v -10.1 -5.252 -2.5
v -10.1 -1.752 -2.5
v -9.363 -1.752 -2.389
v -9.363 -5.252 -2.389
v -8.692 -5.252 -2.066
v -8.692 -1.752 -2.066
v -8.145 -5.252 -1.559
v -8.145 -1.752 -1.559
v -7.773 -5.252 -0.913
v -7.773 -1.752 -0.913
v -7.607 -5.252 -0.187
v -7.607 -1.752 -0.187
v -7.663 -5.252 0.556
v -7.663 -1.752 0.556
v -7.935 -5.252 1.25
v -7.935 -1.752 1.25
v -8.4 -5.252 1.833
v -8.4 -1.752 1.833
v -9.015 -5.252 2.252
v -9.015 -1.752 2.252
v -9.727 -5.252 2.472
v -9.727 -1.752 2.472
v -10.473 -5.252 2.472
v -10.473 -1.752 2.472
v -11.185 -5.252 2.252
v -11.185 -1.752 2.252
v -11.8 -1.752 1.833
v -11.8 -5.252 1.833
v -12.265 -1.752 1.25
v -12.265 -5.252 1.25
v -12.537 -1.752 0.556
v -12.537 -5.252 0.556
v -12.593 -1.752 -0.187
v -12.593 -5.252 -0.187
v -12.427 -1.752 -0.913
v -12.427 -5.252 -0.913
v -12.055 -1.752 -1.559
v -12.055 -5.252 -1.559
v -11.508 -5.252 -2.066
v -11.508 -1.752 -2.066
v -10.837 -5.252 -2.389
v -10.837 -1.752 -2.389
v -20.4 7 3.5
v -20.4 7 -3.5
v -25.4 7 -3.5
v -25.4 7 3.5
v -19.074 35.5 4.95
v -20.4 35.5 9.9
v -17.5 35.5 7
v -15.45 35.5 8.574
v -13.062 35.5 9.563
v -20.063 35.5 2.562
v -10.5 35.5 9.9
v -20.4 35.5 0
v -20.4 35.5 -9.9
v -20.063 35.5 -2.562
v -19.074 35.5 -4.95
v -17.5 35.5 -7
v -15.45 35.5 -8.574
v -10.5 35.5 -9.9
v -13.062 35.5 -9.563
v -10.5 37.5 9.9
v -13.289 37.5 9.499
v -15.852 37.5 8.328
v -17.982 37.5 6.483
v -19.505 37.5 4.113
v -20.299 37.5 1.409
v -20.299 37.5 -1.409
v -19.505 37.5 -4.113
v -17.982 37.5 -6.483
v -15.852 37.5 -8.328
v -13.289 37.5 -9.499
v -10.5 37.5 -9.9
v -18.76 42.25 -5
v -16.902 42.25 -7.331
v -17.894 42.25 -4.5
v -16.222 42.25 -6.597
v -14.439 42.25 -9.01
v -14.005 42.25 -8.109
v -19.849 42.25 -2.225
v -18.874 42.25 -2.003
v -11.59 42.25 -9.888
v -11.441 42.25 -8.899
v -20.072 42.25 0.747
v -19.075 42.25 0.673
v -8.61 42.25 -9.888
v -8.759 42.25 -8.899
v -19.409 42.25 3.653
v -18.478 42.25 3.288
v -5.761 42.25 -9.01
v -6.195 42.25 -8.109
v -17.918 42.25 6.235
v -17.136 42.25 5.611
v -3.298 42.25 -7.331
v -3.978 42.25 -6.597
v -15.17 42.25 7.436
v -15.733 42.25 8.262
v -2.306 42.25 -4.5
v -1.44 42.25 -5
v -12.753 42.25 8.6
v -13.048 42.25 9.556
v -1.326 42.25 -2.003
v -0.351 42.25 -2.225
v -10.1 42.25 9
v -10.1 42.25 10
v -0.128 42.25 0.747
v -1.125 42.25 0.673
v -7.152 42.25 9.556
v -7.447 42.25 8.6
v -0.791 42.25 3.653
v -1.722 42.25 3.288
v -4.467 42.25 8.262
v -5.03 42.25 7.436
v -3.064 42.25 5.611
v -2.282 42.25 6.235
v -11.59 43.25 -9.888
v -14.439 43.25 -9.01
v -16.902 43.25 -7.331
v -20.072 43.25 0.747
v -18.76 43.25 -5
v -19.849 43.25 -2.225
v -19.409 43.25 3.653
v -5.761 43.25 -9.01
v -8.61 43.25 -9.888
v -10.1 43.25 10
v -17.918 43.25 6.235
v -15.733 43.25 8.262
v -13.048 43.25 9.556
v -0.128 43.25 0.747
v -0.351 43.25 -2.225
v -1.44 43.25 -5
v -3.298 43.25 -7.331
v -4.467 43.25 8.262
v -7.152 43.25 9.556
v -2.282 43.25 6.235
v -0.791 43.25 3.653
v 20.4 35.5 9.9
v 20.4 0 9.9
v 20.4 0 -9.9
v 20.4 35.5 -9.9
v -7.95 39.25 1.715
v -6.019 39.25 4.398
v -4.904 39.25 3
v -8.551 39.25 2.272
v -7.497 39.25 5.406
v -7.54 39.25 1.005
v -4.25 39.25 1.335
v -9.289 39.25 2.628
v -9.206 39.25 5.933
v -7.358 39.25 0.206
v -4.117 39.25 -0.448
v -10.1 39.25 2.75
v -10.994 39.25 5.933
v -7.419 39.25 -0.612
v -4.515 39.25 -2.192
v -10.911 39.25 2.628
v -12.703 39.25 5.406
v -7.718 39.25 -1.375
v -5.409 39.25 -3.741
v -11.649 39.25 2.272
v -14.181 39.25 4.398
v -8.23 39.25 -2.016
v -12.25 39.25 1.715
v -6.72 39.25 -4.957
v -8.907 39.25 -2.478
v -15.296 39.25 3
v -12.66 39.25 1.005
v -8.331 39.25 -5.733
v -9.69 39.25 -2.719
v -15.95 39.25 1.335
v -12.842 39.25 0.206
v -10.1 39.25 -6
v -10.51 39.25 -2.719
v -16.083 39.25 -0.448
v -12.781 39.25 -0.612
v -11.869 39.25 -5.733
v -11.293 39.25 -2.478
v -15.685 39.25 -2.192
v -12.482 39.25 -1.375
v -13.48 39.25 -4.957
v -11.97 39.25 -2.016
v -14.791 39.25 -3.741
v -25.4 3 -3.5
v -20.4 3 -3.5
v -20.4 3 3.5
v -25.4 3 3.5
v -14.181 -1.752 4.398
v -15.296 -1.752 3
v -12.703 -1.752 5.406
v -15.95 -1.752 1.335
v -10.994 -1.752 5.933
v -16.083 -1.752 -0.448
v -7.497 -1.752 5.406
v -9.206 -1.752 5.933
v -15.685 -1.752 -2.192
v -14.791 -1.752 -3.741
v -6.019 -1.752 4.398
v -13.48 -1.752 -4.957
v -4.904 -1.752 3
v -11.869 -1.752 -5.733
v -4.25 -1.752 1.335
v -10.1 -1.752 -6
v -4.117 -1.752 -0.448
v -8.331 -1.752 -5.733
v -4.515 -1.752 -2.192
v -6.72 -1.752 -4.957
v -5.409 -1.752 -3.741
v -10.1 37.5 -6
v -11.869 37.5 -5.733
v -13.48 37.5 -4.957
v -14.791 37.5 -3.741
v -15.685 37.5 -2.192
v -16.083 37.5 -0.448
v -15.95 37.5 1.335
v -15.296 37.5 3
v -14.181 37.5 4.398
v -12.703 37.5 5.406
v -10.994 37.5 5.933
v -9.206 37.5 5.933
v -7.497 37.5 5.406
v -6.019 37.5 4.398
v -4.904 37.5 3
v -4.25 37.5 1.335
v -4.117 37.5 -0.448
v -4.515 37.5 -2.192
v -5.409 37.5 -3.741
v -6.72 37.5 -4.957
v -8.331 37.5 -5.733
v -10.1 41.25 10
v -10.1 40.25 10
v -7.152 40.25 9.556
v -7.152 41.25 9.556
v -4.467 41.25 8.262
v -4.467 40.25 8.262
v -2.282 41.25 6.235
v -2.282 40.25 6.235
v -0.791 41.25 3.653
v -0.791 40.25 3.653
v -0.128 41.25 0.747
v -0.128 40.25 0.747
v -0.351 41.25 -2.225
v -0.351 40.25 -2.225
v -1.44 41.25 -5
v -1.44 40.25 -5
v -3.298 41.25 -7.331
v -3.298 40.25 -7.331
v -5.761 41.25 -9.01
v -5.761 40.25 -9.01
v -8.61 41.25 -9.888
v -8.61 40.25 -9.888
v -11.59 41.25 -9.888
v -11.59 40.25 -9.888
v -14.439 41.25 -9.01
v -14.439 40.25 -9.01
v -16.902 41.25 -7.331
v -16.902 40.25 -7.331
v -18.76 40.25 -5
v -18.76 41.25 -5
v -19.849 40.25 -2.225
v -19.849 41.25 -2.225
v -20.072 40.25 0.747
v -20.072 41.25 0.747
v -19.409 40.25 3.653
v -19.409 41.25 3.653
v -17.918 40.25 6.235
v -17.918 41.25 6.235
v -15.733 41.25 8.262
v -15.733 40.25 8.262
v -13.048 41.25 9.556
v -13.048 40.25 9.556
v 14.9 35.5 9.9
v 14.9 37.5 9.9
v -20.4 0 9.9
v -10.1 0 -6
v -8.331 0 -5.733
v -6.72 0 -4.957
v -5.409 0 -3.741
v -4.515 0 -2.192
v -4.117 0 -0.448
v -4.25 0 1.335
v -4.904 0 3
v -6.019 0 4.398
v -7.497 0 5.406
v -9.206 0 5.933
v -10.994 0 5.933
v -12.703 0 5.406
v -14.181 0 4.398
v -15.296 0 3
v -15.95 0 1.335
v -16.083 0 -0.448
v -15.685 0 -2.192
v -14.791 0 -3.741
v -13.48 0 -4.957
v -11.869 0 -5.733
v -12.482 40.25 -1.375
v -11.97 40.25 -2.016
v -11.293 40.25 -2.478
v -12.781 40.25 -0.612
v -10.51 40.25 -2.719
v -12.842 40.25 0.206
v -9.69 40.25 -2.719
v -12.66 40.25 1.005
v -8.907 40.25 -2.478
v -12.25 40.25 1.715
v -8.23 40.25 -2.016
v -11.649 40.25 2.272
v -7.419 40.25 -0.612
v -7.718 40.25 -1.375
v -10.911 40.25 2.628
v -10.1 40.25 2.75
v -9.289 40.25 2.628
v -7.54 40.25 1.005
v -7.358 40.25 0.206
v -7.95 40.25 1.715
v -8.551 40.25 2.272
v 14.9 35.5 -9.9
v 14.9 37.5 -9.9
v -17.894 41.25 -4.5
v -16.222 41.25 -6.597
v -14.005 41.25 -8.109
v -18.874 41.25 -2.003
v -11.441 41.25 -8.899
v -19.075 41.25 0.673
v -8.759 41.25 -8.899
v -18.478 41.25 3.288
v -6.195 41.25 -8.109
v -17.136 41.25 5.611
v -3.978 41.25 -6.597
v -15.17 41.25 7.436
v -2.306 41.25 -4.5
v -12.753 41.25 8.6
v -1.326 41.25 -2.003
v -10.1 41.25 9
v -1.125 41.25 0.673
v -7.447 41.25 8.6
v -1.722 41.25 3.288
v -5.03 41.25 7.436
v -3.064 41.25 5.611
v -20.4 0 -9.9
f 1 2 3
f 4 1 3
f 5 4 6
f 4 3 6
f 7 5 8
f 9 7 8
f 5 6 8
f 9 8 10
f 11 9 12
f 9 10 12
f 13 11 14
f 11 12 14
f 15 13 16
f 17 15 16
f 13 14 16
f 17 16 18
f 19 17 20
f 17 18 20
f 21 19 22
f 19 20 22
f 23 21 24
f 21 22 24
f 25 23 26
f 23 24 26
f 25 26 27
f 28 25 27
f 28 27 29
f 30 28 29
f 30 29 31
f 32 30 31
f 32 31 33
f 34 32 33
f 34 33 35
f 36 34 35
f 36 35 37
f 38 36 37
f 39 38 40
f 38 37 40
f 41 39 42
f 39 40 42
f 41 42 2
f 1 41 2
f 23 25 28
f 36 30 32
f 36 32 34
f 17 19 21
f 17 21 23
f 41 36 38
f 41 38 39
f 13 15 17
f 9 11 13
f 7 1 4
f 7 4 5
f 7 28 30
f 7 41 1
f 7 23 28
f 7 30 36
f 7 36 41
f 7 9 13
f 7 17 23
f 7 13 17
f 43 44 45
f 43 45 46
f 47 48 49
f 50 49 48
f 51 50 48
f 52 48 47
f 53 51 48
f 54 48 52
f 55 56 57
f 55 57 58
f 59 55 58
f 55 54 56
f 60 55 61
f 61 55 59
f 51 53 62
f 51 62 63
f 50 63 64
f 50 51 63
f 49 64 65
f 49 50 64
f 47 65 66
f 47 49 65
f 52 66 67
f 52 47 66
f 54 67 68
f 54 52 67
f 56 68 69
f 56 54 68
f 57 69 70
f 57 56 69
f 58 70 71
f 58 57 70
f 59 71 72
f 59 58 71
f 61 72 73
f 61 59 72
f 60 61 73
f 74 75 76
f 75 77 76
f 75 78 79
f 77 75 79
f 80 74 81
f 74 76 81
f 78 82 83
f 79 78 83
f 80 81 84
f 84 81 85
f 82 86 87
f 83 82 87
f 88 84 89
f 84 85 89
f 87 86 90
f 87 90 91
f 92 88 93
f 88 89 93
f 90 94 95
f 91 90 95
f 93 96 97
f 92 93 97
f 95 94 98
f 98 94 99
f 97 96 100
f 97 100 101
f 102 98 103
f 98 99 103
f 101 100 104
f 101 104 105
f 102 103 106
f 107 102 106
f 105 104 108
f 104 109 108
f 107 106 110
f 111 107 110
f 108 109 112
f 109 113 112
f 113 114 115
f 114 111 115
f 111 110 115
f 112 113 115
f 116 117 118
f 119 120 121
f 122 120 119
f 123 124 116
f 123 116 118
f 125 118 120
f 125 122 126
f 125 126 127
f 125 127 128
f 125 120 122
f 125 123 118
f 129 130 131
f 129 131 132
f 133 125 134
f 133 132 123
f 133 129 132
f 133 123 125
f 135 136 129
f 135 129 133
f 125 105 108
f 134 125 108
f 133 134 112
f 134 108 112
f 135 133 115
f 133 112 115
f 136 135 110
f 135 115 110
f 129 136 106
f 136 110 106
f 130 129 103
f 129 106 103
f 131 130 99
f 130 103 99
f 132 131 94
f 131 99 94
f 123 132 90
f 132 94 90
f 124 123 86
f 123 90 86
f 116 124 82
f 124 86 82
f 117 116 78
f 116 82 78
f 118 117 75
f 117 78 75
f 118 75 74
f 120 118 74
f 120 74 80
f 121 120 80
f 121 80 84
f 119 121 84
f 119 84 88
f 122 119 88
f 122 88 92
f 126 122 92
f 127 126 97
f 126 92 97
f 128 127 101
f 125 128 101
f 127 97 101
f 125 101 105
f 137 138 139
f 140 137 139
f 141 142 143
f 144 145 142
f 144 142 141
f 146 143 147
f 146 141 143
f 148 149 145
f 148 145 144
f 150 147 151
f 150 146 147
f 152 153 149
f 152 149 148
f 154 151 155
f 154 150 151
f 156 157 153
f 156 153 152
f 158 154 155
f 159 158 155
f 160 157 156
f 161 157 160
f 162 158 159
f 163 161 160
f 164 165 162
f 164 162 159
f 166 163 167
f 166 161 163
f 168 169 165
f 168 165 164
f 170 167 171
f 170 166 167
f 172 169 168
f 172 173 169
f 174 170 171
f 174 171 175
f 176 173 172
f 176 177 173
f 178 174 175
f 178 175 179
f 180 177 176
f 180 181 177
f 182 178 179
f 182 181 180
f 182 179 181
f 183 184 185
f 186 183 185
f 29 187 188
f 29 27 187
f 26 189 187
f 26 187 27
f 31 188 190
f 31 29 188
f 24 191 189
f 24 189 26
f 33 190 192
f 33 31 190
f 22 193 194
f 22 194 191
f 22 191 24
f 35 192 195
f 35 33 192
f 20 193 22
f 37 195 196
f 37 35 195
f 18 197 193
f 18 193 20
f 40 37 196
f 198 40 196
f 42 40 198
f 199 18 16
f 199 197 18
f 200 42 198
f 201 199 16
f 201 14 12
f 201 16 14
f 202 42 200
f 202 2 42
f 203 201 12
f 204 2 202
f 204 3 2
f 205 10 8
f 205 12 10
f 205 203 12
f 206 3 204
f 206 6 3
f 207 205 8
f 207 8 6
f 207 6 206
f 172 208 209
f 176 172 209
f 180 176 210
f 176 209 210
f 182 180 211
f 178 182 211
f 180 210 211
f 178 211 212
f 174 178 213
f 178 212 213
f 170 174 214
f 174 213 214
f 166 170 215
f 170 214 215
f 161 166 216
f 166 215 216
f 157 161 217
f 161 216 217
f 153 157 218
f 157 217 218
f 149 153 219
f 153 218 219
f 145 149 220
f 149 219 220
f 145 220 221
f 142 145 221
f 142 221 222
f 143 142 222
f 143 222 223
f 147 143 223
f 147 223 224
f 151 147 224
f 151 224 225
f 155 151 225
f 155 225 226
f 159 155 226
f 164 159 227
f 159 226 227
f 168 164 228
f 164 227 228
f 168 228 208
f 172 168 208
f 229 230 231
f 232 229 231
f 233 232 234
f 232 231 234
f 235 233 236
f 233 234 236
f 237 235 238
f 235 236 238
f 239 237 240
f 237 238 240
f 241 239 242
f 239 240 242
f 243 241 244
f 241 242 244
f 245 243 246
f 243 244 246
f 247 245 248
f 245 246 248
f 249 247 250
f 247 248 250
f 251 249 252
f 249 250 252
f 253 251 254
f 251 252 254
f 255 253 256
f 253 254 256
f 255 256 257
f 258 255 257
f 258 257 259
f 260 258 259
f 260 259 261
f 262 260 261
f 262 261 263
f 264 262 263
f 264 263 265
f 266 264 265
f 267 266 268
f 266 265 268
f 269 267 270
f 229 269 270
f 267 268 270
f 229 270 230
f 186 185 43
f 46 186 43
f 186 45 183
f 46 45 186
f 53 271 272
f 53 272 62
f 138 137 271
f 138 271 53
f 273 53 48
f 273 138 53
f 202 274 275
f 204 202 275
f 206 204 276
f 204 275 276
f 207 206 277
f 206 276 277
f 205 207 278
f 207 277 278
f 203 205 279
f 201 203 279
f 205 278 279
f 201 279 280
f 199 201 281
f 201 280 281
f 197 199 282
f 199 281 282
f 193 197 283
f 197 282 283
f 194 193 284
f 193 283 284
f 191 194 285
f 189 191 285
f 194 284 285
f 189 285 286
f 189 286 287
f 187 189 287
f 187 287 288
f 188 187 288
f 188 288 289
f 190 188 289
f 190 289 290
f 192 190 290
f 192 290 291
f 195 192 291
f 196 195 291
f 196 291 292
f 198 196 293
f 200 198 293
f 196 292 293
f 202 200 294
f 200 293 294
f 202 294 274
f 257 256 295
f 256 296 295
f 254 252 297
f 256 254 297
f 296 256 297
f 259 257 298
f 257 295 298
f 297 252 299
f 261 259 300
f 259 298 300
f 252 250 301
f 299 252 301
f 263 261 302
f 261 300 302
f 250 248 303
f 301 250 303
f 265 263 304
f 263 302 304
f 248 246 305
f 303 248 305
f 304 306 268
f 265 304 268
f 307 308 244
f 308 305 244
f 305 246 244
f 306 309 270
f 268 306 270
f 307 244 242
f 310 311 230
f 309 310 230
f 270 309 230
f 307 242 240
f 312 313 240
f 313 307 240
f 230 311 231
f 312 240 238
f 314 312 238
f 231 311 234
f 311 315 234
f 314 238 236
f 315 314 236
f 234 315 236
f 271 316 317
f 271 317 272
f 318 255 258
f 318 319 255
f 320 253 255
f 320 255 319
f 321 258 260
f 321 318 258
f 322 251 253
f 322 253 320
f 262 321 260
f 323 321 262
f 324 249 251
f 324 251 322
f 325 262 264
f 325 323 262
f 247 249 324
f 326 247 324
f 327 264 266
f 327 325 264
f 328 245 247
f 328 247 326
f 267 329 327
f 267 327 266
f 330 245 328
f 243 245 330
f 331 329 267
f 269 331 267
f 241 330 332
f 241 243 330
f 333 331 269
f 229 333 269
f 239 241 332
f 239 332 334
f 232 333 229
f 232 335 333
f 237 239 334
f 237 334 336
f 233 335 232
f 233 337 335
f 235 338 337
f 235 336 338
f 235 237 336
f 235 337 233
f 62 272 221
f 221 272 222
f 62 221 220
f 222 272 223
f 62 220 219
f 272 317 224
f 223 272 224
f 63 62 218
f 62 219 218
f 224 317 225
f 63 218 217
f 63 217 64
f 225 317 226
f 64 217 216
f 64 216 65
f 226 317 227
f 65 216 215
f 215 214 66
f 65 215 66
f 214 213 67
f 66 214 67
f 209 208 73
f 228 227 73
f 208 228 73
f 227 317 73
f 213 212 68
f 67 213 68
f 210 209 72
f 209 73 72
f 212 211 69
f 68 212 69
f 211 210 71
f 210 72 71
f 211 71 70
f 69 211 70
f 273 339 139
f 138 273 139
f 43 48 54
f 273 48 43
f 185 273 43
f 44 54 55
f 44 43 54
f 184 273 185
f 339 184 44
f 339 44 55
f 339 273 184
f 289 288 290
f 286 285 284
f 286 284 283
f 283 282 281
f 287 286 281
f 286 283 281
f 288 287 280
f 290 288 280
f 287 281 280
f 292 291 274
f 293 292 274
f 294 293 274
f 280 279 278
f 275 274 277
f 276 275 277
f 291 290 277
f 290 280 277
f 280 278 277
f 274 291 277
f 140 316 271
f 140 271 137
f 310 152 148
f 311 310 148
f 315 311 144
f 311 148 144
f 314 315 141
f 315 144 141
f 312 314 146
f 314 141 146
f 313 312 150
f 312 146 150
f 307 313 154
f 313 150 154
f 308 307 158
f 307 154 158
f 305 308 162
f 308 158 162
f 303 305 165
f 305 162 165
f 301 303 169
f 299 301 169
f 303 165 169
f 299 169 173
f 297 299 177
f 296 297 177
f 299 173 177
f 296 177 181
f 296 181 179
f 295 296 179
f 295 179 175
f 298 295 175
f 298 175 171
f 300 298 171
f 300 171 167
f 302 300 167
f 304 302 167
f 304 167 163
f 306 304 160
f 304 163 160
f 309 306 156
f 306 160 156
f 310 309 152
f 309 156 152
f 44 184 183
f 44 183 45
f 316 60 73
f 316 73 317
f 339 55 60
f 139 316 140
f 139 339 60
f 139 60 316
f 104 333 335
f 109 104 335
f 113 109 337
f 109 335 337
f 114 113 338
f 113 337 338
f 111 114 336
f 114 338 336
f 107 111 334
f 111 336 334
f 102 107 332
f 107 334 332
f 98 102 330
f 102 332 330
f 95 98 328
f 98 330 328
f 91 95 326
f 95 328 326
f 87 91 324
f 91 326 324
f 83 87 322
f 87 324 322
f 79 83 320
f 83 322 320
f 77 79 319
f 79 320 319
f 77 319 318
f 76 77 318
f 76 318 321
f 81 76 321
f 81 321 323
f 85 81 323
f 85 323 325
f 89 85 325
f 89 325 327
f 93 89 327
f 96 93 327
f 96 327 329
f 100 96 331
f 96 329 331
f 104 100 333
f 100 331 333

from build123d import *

# Parameters (mm, degrees)
SKETCH1_W            = 40.8
SKETCH1_H            = 19.8
BOSS_EXTRUDE1_DEPTH  = 35.5
BOSS_EXTRUDE2_DEPTH  = 2
SKETCH2_R            = 6
BOSS_EXTRUDE3_DEPTH  = 1.752137049
SKETCH5_R            = 6
BOSS_EXTRUDE4_DEPTH  = 1.75
SKETCH6_R            = 2.5
BOSS_EXTRUDE5_DEPTH  = 3.5
SKETCH7_R            = 2.75
BOSS_EXTRUDE6_DEPTH  = 1
SKETCH8_W            = 7
SKETCH8_H            = 4
BOSS_EXTRUDE7_DEPTH  = 5
SKETCH10_R           = 10
BOSS_EXTRUDE9_DEPTH  = 1
SKETCH14_R           = 9
BOSS_EXTRUDE10_DEPTH = 1
SKETCH15_R           = 10
BOSS_EXTRUDE11_DEPTH = 1


with BuildPart() as part:
    # Sketch1 → Boss-Extrude1 (new body)
    with BuildSketch(Plane(origin=(0, 0, 0), x_dir=(1, 0, 0), z_dir=(0, 1, 0))):
        Rectangle(SKETCH1_W, SKETCH1_H)
    extrude(amount=BOSS_EXTRUDE1_DEPTH)

    # Sketch4 → Boss-Extrude2 (add)
    with BuildSketch(Plane(origin=(0, 35.5, 0), x_dir=(1, 0, 0), z_dir=(0, 1, 0))):
        with BuildLine():
            Line((14.9, 9.9), (14.9, -9.9))
            Line((14.9, -9.9), (-10.5, -9.9))
            ThreePointArc((-10.5, -9.9), (-20.4, 0), (-10.5, 9.9))
            Line((-10.5, 9.9), (14.9, 9.9))
        make_face()
    extrude(amount=BOSS_EXTRUDE2_DEPTH)

    # Sketch5 → Boss-Extrude4 (add)
    with BuildSketch(Plane(origin=(0, 37.5, 0), x_dir=(1, 0, 0), z_dir=(0, 1, 0))):
        with Locations(Location((-10.1, 0, 0), (0, 0, 90))):
            Circle(SKETCH5_R)
    extrude(amount=BOSS_EXTRUDE4_DEPTH)

    # Sketch7 → Boss-Extrude6 (add)
    with BuildSketch(Plane(origin=(0, 39.25, 0), x_dir=(1, 0, 0), z_dir=(0, 1, 0))):
        with Locations(Location((-10.1, 0, 0), (0, 0, 270))):
            Circle(SKETCH7_R)
    extrude(amount=BOSS_EXTRUDE6_DEPTH)

    # Sketch8 → Boss-Extrude7 (add)
    with BuildSketch(Plane.ZY.offset(20.4)):
        with Locations((0, 5)):
            Rectangle(SKETCH8_W, SKETCH8_H)
    extrude(amount=BOSS_EXTRUDE7_DEPTH)

    # Sketch10 → Boss-Extrude9 (add)
    with BuildSketch(Plane(origin=(0, 40.25, 0), x_dir=(1, 0, 0), z_dir=(0, 1, 0))):
        with Locations(Location((-10.1, 0, 0), (0, 0, 270))):
            Circle(SKETCH10_R)
    extrude(amount=BOSS_EXTRUDE9_DEPTH)

    # Sketch14 → Boss-Extrude10 (add)
    with BuildSketch(Plane(origin=(0, 41.25, 0), x_dir=(1, 0, 0), z_dir=(0, 1, 0))):
        with Locations(Location((-10.1, 0, 0), (0, 0, 270))):
            Circle(SKETCH14_R)
    extrude(amount=BOSS_EXTRUDE10_DEPTH)

    # Sketch15 → Boss-Extrude11 (add)
    with BuildSketch(Plane(origin=(0, 42.25, 0), x_dir=(1, 0, 0), z_dir=(0, 1, 0))):
        with Locations(Location((-10.1, 0, 0), (0, 0, 270))):
            Circle(SKETCH15_R)
    extrude(amount=BOSS_EXTRUDE11_DEPTH)


with BuildPart() as body_2:
    # Sketch2 → Boss-Extrude3 (new body)
    with BuildSketch(Plane.XZ):
        with Locations(Location((-10.1, 0, 0), (0, 0, 270))):
            Circle(SKETCH2_R)
    extrude(amount=BOSS_EXTRUDE3_DEPTH)

    # Sketch6 → Boss-Extrude5 (add)
    with BuildSketch(Plane.XZ.offset(1.752137049)):
        with Locations(Location((-10.1, 0, 0), (0, 0, 270))):
            Circle(SKETCH6_R)
    extrude(amount=BOSS_EXTRUDE5_DEPTH)


solid = Compound([part.part, body_2.part])
